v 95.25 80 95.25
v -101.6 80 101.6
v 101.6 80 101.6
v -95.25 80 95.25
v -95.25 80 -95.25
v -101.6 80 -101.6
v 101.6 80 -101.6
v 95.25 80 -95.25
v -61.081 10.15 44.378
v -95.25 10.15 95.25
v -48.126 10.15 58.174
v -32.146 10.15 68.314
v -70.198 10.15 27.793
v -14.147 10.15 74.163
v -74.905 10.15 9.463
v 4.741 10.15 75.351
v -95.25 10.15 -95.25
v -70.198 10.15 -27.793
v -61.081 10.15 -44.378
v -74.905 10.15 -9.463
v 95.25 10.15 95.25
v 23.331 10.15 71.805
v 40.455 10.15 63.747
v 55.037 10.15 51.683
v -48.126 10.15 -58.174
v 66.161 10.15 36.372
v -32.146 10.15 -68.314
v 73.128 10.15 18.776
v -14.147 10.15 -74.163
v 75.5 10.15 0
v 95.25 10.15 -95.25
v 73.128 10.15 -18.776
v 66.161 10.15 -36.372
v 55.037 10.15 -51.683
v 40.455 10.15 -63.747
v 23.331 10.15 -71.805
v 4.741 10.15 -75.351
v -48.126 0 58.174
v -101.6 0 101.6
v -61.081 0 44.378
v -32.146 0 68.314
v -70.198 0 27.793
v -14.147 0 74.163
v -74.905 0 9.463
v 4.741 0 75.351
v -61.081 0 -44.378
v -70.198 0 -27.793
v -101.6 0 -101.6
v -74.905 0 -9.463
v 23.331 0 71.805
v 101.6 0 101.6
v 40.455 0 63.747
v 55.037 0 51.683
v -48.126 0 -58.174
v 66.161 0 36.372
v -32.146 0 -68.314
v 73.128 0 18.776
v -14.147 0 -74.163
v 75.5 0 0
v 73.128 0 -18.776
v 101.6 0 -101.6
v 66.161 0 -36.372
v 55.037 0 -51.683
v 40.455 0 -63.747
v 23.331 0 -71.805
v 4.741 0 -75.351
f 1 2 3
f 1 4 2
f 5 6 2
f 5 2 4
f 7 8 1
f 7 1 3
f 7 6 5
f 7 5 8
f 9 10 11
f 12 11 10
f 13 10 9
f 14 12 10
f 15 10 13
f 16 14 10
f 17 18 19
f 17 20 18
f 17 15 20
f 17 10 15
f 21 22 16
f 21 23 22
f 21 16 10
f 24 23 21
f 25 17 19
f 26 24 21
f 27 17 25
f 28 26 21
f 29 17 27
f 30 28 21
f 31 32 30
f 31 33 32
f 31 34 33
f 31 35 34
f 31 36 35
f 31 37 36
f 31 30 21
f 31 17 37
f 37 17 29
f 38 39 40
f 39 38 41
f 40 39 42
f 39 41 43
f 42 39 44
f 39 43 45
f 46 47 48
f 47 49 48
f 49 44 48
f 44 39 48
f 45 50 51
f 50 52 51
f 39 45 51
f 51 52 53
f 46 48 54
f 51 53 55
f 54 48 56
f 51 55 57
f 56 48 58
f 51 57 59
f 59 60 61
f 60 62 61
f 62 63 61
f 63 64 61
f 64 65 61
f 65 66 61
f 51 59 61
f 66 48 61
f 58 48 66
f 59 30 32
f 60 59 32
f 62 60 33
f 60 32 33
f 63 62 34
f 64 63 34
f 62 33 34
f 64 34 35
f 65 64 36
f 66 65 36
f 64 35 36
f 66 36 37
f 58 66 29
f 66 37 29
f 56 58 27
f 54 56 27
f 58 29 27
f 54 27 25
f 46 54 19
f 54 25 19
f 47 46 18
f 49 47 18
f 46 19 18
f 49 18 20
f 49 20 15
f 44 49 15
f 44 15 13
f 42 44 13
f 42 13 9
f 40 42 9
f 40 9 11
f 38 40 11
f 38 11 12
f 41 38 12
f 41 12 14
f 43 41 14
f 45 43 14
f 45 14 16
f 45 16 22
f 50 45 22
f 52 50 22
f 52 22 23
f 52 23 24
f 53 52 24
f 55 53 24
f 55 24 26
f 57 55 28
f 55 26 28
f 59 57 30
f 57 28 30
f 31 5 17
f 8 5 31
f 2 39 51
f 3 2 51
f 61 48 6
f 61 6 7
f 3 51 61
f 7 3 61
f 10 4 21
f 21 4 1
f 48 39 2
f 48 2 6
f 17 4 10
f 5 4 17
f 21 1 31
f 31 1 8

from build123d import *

# Parameters (mm, degrees)
SKETCH1_W           = 203.2
SKETCH1_H           = 203.2
BOSS_EXTRUDE1_DEPTH = 80
SKETCH3_R           = 75.5
CUT_EXTRUDE1_DEPTH  = 80
SKETCH4_W           = 190.5
SKETCH4_H           = 190.5
CUT_EXTRUDE2_DEPTH  = 69.85


with BuildPart() as part:
    # Sketch1 → Boss-Extrude1 (new body)
    with BuildSketch(Plane(origin=(0, 0, 0), x_dir=(1, 0, 0), z_dir=(0, 1, 0))):
        Rectangle(SKETCH1_W, SKETCH1_H)
    extrude(amount=BOSS_EXTRUDE1_DEPTH)

    # Sketch3 → Cut-Extrude1 (cut)
    with BuildSketch(Plane(origin=(0, 80, 0), x_dir=(1, 0, 0), z_dir=(0, 1, 0))):
        Circle(SKETCH3_R)
    extrude(amount=-CUT_EXTRUDE1_DEPTH, mode=Mode.SUBTRACT)

    # Sketch4 → Cut-Extrude2 (cut)
    with BuildSketch(Plane(origin=(0, 80, 0), x_dir=(1, 0, 0), z_dir=(0, 1, 0))):
        Rectangle(SKETCH4_W, SKETCH4_H)
    extrude(amount=-CUT_EXTRUDE2_DEPTH, mode=Mode.SUBTRACT)


solid = part.part
